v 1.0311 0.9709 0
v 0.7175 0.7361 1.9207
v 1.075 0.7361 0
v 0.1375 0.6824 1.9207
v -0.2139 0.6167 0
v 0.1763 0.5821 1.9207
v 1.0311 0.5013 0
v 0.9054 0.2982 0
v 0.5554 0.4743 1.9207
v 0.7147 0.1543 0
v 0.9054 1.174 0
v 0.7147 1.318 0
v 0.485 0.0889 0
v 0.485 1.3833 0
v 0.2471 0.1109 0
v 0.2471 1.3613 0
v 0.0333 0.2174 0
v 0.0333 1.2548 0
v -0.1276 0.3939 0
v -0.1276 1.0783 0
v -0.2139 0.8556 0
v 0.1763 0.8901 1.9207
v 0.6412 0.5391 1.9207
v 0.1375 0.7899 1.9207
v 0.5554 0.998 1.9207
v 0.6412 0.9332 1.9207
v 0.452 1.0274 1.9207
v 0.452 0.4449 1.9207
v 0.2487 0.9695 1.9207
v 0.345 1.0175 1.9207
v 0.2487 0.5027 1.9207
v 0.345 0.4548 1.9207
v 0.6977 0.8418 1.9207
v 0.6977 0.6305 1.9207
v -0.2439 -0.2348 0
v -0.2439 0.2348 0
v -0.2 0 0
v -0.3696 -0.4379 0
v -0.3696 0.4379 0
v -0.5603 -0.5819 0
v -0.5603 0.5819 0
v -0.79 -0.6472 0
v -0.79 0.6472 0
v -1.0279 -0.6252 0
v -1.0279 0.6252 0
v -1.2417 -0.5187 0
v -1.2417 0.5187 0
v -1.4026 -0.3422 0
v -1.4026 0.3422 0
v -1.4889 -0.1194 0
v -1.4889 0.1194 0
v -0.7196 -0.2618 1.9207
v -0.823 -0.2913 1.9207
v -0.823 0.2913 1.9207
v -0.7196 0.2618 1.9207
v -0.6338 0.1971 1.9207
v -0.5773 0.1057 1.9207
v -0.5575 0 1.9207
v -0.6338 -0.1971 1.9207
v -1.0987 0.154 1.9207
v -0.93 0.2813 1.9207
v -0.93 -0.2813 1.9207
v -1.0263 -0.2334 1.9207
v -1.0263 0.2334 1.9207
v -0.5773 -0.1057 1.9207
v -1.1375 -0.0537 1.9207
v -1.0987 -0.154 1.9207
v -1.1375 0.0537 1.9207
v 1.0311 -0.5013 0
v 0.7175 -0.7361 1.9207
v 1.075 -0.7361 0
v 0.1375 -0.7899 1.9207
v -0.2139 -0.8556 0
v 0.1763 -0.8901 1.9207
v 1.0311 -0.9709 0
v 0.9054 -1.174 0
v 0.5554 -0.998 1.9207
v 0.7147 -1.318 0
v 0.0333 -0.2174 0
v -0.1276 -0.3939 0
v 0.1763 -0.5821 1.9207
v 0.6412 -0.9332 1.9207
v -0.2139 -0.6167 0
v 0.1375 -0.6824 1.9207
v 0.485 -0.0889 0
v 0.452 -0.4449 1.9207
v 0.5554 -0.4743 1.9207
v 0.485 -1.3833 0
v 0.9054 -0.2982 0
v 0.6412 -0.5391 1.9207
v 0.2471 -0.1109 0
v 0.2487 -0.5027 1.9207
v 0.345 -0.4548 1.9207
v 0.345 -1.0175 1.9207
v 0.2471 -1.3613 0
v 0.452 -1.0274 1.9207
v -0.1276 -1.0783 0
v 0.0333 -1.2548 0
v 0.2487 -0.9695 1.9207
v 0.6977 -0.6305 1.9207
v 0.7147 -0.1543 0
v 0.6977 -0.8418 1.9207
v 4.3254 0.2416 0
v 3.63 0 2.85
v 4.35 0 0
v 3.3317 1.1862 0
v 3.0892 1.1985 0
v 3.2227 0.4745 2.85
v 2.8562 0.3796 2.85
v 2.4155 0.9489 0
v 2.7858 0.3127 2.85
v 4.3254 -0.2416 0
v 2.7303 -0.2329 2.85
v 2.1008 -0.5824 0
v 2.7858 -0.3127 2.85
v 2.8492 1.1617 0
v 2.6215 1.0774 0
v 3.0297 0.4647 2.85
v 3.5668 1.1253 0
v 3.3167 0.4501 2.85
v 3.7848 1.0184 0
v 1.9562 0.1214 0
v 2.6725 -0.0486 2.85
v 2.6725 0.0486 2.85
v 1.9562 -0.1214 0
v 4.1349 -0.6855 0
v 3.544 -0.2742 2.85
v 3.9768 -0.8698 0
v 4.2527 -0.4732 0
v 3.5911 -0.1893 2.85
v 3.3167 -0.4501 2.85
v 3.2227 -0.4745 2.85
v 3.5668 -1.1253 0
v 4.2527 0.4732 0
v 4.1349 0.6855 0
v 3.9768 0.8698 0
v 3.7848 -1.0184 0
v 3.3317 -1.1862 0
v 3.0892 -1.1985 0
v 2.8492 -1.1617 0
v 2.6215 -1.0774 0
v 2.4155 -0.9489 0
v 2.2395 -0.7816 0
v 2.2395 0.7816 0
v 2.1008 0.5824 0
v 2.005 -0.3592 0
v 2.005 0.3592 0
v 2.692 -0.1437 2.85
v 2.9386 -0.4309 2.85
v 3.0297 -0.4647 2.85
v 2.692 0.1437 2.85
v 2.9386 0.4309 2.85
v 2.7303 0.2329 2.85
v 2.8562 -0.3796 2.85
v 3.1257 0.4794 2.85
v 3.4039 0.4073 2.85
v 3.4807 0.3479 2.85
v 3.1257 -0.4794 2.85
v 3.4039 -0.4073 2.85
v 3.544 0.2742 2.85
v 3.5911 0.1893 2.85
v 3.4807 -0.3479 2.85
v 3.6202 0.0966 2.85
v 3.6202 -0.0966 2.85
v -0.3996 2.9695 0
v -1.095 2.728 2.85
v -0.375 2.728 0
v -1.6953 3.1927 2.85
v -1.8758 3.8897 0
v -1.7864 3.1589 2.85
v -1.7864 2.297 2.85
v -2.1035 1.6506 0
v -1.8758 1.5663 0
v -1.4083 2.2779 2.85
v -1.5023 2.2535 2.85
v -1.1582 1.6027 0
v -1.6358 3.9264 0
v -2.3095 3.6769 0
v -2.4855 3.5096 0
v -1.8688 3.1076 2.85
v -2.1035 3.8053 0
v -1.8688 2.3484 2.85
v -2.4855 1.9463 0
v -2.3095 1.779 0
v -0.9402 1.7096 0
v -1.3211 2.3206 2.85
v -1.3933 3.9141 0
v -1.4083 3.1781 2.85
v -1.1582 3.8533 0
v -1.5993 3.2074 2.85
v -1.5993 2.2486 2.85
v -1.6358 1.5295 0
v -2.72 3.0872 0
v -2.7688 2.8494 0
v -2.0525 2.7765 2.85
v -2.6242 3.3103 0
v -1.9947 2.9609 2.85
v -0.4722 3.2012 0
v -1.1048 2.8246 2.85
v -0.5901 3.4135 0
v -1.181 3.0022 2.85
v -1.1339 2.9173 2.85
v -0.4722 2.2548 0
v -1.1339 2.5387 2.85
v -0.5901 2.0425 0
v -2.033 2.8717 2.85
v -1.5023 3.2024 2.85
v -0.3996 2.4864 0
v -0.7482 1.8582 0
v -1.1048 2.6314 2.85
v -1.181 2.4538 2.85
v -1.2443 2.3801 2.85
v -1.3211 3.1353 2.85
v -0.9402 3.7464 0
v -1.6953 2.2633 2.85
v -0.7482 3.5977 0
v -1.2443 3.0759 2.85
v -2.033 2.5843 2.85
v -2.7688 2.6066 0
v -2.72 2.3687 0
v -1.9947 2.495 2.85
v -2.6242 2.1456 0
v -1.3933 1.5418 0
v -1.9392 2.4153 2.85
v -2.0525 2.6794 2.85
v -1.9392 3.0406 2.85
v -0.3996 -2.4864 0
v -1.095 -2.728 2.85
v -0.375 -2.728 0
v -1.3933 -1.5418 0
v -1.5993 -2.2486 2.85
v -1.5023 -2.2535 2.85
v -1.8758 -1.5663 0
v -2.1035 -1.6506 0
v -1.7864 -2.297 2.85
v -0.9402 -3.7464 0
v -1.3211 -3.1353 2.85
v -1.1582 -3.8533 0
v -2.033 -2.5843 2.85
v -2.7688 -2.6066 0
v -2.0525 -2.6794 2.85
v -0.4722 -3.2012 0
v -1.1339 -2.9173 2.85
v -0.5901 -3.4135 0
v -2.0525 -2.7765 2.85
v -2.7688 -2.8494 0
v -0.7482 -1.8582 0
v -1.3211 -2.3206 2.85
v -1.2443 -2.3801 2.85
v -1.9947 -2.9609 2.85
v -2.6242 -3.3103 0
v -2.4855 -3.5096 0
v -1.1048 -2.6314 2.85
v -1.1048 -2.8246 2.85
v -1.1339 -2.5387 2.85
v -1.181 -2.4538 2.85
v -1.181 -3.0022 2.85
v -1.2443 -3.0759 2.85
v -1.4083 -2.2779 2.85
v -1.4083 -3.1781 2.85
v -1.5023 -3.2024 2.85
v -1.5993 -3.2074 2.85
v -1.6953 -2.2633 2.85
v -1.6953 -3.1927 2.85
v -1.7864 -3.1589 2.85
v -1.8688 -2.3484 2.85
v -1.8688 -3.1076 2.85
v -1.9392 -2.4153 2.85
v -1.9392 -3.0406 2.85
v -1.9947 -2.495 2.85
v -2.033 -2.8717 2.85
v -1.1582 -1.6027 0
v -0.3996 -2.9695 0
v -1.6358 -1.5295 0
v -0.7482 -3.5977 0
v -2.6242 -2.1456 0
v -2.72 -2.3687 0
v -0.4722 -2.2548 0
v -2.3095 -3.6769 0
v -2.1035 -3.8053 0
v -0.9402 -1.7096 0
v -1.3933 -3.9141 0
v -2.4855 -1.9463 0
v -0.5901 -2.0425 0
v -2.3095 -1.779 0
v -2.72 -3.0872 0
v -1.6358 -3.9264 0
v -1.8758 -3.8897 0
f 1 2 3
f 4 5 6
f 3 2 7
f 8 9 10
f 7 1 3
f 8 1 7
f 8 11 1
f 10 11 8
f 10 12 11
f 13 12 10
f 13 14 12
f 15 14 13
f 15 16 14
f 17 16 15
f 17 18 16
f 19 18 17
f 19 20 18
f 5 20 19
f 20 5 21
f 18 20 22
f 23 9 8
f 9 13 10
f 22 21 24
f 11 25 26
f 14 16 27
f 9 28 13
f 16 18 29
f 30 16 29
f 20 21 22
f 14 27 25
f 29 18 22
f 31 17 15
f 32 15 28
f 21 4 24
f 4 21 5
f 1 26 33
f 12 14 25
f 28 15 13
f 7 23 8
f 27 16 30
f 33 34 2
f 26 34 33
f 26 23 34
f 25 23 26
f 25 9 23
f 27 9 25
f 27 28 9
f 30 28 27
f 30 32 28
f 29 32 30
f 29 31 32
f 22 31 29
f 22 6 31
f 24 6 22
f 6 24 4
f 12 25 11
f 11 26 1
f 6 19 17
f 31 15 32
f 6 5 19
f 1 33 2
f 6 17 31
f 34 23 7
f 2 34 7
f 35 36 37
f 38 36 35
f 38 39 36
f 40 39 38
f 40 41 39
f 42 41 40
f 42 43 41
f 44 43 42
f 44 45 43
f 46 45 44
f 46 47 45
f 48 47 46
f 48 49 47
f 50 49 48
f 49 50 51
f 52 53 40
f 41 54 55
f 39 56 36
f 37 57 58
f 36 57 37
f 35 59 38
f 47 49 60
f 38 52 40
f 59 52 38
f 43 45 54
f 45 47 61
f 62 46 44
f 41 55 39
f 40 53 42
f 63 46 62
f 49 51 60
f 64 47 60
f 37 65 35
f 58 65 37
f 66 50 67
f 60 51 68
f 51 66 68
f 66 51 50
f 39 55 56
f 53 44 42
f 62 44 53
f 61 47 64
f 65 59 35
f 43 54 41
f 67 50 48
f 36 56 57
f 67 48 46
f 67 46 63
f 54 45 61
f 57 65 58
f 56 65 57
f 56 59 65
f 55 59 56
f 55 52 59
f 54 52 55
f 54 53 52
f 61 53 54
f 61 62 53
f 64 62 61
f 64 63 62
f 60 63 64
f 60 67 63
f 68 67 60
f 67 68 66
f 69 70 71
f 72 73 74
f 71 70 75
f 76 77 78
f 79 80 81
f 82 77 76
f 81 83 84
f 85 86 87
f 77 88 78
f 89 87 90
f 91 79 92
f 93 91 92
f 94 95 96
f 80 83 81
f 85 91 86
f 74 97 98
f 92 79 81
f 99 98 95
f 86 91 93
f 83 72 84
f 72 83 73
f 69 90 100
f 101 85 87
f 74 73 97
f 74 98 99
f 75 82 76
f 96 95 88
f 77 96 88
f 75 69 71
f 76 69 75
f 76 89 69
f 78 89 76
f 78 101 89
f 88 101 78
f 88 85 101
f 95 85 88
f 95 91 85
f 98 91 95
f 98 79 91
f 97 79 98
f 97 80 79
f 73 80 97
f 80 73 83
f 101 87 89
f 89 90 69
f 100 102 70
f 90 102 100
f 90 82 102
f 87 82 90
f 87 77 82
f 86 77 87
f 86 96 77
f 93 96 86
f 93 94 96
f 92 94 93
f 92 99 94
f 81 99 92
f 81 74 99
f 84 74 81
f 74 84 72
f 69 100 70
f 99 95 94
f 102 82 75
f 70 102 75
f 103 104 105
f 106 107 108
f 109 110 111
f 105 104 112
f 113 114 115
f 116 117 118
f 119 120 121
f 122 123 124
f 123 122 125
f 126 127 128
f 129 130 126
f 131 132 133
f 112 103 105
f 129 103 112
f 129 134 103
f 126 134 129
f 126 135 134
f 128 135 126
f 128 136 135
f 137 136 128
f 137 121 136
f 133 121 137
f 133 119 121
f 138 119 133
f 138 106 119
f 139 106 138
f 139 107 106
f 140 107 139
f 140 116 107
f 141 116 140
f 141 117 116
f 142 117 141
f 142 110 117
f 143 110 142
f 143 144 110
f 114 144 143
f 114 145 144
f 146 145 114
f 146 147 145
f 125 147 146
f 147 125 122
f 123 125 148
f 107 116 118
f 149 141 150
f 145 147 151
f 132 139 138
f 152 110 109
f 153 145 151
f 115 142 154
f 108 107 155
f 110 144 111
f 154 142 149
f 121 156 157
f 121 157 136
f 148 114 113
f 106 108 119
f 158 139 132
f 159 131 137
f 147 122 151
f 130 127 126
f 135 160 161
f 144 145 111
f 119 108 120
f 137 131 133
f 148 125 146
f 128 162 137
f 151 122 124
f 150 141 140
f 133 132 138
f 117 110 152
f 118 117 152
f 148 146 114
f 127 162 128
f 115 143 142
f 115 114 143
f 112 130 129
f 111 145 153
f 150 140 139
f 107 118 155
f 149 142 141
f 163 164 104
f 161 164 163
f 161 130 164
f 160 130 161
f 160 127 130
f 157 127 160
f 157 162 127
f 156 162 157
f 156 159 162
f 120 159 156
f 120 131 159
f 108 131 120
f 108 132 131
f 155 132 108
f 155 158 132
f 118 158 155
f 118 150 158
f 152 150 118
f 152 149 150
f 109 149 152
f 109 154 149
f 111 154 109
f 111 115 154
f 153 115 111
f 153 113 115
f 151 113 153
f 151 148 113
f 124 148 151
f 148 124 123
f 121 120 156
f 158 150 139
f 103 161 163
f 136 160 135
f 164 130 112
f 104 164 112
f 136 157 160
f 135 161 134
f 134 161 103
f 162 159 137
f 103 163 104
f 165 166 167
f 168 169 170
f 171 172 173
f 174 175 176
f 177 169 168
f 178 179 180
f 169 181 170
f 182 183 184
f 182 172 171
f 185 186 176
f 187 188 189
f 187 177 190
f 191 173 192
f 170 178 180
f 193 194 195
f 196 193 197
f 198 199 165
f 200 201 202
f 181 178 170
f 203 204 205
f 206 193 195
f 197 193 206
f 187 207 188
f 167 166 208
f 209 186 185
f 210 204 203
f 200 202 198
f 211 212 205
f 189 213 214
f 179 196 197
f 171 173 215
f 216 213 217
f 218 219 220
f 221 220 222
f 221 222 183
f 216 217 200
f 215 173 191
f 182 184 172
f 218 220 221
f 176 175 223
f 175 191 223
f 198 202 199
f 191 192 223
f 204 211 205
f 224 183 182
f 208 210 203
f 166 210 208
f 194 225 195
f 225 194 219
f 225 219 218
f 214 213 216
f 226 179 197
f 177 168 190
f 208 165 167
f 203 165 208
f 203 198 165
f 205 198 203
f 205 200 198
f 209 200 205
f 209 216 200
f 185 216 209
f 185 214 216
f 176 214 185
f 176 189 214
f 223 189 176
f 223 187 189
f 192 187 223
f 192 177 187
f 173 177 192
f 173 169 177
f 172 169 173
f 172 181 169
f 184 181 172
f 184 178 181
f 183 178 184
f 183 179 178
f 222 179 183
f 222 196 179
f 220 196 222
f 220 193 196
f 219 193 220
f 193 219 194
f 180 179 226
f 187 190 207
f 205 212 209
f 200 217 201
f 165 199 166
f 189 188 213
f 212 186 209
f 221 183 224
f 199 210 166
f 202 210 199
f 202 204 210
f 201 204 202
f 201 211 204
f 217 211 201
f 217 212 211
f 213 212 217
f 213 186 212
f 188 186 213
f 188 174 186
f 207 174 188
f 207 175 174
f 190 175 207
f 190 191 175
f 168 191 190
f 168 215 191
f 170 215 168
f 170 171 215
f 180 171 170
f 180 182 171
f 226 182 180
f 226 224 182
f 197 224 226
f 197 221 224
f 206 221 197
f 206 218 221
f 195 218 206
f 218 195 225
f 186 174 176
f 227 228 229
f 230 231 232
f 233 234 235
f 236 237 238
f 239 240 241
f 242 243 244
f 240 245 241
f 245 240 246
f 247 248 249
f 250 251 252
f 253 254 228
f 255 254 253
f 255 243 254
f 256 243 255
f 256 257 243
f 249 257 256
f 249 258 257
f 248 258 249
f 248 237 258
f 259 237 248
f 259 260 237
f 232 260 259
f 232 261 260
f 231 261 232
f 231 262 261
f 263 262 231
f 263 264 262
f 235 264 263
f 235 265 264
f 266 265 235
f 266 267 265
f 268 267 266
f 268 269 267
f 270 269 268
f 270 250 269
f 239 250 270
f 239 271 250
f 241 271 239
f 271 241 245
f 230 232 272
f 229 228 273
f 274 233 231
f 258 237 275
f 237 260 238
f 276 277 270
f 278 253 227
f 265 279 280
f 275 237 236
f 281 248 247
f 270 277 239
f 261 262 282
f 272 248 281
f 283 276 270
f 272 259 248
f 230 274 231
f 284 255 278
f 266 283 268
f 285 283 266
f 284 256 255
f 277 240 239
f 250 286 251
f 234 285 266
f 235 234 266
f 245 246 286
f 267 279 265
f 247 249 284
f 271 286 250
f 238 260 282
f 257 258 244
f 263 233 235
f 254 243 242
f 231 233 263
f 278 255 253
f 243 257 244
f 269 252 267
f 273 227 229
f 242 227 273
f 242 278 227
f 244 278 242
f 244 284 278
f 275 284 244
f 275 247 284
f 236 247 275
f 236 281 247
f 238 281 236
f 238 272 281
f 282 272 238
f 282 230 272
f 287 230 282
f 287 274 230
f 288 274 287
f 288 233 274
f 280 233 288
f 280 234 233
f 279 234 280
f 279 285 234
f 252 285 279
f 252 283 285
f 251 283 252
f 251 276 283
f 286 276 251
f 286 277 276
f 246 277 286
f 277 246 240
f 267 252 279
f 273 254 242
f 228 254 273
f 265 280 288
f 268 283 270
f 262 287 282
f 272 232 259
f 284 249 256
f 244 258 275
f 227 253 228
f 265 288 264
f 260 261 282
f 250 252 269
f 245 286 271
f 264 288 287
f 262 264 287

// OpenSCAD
// Engine bells only, for the web CAD preview (rendered black).
use <starship_parametric.scad>

engine_bells();
